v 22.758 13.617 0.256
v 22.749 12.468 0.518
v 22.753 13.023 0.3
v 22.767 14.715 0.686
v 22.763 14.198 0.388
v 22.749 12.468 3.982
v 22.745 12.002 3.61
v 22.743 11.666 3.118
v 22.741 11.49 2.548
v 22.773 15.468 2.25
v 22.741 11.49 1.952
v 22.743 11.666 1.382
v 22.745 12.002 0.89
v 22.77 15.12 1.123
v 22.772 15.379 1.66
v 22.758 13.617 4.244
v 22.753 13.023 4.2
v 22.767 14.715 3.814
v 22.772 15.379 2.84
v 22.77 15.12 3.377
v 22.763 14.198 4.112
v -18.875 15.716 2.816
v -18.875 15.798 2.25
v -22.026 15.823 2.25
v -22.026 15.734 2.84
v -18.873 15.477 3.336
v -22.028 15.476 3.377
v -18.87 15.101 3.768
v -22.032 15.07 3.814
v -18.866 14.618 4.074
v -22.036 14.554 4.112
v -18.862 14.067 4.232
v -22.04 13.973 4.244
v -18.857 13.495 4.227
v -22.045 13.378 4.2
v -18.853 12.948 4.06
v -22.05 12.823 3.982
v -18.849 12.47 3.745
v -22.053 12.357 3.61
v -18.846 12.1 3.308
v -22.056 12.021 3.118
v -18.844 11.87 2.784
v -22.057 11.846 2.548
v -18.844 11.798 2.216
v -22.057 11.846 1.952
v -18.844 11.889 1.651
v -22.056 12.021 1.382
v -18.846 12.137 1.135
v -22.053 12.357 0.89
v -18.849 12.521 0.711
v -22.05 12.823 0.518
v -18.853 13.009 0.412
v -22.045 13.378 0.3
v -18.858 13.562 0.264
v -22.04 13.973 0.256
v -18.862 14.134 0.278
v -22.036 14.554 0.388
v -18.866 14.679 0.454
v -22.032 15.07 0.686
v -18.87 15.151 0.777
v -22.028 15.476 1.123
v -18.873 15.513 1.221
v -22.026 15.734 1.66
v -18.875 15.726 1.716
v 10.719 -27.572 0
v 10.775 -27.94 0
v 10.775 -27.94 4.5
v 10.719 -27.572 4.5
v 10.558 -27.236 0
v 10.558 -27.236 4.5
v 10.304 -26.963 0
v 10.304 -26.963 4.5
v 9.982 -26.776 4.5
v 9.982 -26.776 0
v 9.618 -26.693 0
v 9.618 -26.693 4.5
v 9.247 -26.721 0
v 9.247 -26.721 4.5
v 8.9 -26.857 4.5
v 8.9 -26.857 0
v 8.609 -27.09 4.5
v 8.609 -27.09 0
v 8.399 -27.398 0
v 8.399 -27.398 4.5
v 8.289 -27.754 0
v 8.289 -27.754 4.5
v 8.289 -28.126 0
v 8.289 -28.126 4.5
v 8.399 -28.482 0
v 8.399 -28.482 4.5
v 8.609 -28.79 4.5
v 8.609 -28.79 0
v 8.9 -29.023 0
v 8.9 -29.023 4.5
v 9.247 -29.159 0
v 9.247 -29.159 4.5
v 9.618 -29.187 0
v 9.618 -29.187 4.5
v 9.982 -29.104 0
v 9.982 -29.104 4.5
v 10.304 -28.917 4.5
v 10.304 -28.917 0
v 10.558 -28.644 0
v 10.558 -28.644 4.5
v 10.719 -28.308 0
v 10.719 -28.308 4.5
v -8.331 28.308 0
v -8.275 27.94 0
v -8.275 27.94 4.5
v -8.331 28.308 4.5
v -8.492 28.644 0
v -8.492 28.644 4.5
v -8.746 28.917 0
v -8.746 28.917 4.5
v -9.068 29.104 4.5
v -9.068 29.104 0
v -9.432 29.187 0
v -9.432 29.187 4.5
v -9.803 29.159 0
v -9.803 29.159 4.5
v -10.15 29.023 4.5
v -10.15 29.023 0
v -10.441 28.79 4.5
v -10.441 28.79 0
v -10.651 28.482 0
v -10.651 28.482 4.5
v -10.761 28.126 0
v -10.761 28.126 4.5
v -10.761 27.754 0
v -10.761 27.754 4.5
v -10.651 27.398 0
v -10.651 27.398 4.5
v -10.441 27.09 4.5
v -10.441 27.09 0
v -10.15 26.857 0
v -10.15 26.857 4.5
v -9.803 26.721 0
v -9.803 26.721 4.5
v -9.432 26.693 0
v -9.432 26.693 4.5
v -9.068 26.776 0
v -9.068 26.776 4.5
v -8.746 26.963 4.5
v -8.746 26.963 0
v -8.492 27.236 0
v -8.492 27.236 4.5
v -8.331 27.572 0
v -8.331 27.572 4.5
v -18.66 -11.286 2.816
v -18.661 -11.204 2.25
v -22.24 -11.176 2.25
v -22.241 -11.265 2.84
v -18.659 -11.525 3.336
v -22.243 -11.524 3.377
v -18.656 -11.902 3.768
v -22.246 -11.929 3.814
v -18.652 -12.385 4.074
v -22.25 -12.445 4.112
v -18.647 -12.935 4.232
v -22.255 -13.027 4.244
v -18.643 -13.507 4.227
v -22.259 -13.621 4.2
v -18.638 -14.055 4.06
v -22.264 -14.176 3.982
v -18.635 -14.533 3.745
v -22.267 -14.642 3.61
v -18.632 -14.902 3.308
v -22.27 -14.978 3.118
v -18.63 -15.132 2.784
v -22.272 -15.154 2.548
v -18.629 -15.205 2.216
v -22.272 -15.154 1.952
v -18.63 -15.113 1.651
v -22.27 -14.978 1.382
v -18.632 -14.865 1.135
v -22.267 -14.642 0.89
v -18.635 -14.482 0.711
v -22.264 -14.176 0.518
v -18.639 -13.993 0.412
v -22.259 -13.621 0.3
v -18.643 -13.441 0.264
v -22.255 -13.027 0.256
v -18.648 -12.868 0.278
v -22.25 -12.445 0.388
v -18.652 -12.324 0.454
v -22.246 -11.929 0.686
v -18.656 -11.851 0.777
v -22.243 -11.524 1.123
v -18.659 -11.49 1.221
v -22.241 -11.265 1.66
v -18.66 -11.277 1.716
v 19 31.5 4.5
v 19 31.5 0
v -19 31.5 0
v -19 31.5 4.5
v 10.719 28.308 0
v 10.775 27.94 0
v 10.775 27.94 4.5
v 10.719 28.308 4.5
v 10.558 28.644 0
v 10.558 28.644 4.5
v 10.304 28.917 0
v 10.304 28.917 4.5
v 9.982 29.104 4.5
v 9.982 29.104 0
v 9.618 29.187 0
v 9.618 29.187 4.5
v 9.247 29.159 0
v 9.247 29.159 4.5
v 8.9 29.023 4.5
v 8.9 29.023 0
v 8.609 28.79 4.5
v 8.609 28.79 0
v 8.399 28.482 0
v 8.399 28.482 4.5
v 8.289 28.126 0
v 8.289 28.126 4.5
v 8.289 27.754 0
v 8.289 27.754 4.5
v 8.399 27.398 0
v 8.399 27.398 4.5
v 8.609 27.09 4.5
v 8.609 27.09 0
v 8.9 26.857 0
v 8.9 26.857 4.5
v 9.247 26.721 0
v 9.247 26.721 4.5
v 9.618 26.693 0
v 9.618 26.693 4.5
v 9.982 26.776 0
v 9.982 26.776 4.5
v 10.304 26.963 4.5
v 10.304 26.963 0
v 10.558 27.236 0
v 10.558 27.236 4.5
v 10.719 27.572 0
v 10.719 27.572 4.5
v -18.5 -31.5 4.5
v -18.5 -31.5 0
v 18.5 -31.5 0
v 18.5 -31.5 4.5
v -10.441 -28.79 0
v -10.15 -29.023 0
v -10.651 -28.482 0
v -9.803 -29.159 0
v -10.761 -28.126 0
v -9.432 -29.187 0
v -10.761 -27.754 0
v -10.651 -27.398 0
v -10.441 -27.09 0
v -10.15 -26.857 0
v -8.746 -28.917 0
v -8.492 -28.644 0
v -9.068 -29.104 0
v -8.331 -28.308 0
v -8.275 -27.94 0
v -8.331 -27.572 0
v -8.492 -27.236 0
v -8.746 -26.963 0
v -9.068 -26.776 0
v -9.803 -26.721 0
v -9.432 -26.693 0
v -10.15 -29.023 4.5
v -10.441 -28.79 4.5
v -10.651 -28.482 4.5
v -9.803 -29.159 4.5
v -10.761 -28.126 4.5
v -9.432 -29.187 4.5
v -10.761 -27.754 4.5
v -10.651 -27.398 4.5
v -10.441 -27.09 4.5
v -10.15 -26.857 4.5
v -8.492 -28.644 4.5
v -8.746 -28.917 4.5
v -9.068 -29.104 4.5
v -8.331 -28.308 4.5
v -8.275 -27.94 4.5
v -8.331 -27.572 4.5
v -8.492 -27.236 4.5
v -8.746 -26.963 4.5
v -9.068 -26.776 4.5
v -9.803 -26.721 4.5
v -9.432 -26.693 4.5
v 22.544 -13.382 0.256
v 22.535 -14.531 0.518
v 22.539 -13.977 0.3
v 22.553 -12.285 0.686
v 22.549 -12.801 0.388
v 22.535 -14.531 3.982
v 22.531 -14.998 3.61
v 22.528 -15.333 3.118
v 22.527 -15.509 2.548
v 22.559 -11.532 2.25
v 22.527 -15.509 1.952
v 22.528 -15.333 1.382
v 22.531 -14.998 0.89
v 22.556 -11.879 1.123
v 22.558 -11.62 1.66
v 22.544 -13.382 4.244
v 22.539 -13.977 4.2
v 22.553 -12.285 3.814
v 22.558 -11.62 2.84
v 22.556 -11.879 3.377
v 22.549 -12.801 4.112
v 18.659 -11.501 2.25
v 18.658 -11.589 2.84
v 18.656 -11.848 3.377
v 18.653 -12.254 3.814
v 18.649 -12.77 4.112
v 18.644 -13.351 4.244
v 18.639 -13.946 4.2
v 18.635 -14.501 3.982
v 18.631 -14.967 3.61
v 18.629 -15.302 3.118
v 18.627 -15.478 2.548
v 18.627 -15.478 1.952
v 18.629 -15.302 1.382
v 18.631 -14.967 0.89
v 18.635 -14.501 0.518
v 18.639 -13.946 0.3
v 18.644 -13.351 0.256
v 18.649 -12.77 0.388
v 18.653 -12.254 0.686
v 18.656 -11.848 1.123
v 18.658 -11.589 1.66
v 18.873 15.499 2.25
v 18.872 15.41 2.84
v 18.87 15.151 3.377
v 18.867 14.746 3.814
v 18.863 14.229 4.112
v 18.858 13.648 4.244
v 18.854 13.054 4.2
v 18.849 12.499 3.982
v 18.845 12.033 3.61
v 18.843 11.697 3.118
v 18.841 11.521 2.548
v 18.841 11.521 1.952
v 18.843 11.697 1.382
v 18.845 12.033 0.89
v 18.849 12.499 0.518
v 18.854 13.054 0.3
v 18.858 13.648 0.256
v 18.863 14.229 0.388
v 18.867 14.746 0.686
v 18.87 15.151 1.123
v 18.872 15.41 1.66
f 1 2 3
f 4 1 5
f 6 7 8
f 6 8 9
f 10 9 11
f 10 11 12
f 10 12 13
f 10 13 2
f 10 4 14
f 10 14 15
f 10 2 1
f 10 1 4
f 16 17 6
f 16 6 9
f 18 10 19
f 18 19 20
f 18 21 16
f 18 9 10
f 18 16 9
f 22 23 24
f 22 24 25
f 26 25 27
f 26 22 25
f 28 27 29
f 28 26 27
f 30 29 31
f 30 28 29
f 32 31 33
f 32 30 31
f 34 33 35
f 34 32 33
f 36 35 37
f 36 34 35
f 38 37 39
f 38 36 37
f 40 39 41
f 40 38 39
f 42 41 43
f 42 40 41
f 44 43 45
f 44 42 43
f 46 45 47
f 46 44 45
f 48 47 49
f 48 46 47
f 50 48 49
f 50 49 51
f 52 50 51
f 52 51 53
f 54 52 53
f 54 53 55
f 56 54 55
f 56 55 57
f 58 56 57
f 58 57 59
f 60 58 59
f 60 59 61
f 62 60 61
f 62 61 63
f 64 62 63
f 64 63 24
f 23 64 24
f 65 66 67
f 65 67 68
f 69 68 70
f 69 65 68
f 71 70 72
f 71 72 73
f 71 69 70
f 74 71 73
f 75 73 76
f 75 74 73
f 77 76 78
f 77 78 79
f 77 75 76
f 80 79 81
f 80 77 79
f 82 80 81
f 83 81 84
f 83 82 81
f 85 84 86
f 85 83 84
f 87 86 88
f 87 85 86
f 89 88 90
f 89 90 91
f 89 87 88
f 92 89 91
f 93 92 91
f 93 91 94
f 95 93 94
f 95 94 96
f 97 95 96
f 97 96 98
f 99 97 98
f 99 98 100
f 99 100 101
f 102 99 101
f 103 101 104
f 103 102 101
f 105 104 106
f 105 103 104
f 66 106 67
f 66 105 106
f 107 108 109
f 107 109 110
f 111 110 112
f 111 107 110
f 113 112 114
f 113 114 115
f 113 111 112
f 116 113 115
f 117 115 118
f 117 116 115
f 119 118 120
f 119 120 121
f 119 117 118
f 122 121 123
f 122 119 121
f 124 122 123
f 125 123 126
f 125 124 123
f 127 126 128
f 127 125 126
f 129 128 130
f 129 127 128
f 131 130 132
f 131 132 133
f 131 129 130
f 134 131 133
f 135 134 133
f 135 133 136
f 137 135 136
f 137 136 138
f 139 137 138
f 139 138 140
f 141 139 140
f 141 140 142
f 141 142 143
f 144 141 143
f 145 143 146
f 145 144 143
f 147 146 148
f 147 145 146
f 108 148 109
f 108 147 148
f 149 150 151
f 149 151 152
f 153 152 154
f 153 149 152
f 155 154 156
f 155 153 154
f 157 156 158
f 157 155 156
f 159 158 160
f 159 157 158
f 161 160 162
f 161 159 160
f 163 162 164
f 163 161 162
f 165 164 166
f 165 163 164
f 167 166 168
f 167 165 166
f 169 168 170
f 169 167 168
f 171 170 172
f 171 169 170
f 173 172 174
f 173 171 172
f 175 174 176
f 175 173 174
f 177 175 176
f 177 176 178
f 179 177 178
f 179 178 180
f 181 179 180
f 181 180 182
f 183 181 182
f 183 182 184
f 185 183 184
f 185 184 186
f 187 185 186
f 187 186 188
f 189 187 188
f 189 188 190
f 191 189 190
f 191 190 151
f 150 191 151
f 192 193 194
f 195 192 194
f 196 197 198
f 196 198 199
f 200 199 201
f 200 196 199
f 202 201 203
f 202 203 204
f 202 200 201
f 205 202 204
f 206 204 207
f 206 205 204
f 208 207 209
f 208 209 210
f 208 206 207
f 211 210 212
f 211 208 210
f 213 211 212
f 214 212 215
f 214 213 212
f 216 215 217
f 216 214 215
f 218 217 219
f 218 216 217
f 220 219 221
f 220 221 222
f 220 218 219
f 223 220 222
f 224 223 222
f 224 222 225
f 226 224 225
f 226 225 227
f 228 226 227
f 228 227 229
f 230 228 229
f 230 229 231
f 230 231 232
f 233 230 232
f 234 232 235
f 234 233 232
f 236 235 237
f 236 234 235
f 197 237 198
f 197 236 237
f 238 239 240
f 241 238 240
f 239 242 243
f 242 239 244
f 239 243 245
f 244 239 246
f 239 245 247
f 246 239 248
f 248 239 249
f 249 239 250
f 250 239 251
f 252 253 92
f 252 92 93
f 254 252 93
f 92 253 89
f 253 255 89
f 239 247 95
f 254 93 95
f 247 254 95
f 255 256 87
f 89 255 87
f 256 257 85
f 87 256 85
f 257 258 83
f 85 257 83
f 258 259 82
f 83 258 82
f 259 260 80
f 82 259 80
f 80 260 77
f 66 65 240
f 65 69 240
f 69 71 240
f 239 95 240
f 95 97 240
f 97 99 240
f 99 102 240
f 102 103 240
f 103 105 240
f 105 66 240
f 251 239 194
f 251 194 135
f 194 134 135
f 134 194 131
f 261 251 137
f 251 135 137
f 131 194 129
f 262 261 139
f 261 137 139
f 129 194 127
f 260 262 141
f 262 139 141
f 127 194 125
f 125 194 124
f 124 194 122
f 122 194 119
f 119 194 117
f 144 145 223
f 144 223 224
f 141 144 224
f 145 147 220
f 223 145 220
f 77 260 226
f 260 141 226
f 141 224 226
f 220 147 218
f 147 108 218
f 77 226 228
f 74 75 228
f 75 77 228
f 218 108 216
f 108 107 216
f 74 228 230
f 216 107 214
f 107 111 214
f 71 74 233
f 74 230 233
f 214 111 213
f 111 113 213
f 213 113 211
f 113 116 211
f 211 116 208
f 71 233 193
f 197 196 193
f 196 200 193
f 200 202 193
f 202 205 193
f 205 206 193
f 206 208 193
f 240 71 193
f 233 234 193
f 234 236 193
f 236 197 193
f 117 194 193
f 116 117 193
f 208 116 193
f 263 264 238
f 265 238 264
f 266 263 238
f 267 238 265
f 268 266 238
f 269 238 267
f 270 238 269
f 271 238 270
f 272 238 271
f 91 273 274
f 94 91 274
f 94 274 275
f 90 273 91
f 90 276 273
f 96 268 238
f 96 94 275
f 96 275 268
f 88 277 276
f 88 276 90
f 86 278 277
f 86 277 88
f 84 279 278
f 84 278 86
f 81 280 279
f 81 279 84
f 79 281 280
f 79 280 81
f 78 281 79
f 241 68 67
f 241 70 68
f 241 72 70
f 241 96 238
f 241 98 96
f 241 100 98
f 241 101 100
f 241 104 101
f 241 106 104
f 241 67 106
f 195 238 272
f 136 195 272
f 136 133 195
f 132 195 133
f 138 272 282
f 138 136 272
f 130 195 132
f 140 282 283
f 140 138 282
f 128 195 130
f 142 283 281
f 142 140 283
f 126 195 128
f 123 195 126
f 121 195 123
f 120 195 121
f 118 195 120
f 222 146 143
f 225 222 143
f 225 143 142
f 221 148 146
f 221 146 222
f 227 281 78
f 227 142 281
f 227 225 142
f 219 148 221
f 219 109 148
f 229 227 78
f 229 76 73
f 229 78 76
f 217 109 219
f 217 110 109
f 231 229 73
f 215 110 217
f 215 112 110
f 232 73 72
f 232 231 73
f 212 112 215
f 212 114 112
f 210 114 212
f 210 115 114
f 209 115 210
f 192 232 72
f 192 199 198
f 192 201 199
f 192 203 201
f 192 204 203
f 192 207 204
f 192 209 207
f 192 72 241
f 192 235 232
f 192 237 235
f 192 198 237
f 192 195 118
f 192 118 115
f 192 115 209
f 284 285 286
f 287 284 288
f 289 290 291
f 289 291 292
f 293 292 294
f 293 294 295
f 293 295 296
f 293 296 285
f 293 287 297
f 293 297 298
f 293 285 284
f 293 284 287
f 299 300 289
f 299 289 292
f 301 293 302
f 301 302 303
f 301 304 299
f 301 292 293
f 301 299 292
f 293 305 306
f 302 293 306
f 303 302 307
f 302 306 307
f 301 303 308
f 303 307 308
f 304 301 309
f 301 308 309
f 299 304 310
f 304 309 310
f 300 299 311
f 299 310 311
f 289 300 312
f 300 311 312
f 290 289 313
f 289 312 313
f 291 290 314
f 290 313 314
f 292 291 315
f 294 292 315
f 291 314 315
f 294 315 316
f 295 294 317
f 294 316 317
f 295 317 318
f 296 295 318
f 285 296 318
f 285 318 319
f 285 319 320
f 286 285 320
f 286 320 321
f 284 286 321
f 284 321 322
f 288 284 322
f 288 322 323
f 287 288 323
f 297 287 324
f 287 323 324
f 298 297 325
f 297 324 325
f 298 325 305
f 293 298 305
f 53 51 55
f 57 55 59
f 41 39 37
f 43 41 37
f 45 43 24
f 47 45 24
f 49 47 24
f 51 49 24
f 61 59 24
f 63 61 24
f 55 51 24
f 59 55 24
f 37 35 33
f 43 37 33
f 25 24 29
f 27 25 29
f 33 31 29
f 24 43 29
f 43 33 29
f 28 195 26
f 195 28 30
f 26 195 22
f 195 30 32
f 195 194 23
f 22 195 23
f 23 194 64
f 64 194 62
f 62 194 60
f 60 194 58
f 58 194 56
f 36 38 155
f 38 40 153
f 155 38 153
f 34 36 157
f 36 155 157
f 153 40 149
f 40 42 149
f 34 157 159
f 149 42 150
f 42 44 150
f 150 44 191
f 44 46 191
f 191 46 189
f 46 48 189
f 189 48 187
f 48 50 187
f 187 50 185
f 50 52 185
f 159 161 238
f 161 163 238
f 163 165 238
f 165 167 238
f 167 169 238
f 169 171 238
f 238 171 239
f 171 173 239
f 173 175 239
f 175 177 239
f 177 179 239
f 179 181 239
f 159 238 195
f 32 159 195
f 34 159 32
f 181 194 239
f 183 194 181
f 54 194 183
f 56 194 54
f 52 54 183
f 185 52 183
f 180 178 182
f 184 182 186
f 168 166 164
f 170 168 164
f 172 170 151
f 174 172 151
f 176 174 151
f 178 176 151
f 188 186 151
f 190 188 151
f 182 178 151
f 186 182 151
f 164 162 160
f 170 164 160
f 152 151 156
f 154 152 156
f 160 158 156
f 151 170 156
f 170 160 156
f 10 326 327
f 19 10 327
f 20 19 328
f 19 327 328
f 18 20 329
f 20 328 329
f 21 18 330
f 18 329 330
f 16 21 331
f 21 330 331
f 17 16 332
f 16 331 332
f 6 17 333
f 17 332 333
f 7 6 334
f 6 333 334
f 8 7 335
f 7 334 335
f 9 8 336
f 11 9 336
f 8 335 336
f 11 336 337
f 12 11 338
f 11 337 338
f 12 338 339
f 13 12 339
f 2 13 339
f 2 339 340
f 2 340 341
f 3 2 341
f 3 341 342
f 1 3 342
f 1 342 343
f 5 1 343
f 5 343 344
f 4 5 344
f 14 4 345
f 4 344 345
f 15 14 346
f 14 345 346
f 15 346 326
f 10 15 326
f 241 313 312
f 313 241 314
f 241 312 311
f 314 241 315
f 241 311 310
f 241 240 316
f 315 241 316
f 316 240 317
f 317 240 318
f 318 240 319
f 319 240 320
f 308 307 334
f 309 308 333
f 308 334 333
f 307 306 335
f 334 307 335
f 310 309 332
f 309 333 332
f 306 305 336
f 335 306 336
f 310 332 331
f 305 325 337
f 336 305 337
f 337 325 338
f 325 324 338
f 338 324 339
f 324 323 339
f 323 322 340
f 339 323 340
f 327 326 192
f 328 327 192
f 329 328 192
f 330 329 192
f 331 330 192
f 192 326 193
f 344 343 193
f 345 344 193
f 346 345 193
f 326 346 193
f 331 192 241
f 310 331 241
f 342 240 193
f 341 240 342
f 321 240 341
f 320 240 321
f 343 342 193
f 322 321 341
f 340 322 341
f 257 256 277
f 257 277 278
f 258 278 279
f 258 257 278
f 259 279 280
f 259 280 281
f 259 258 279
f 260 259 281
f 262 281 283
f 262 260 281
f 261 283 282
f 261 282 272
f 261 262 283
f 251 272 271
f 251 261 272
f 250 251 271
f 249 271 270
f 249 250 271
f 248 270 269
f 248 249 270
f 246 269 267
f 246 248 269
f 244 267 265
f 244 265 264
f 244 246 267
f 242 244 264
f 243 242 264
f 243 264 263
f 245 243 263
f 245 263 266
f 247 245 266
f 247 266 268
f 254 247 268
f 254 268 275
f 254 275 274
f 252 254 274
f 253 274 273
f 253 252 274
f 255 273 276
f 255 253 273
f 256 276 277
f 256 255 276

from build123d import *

# Parameters (mm, degrees)
F0_R          = 1.25
F1_DEPTH      = 4.5
F3_R          = 2
F4_DEPTH      = 3.9
F4_DEPTH_BACK = 40.9


with BuildPart() as f1:
    # F0 (on Top) → F1 (new body)
    with BuildSketch(Plane.XY):
        Polygon((19, 31.5), (-19, 31.5), (-18.5, -31.5), (18.5, -31.5), align=None)
        with Locations((-9.525, -27.94)):
            Circle(F0_R, mode=Mode.SUBTRACT)
        with Locations((9.525, -27.94)):
            Circle(F0_R, mode=Mode.SUBTRACT)
        with Locations((-9.525, 27.94)):
            Circle(F0_R, mode=Mode.SUBTRACT)
        with Locations((9.525, 27.94)):
            Circle(F0_R, mode=Mode.SUBTRACT)
    extrude(amount=F1_DEPTH)

    # F3 (on offset) → F4 (join, two sides)
    with BuildSketch(Plane(origin=(18.7488190464, -0.1488001512, 0), x_dir=(0.007936258, 0.9999685074, 0), z_dir=(0.9999685074, -0.007936258, 0))) as f4_sk:
        with Locations((13.6478127895, 2.25)):
            Circle(F3_R)
        with Locations((-13.3521872105, 2.25)):
            Circle(F3_R)
    extrude(amount=F4_DEPTH)
    extrude(f4_sk.sketch, amount=-F4_DEPTH_BACK)


solid = f1.part
